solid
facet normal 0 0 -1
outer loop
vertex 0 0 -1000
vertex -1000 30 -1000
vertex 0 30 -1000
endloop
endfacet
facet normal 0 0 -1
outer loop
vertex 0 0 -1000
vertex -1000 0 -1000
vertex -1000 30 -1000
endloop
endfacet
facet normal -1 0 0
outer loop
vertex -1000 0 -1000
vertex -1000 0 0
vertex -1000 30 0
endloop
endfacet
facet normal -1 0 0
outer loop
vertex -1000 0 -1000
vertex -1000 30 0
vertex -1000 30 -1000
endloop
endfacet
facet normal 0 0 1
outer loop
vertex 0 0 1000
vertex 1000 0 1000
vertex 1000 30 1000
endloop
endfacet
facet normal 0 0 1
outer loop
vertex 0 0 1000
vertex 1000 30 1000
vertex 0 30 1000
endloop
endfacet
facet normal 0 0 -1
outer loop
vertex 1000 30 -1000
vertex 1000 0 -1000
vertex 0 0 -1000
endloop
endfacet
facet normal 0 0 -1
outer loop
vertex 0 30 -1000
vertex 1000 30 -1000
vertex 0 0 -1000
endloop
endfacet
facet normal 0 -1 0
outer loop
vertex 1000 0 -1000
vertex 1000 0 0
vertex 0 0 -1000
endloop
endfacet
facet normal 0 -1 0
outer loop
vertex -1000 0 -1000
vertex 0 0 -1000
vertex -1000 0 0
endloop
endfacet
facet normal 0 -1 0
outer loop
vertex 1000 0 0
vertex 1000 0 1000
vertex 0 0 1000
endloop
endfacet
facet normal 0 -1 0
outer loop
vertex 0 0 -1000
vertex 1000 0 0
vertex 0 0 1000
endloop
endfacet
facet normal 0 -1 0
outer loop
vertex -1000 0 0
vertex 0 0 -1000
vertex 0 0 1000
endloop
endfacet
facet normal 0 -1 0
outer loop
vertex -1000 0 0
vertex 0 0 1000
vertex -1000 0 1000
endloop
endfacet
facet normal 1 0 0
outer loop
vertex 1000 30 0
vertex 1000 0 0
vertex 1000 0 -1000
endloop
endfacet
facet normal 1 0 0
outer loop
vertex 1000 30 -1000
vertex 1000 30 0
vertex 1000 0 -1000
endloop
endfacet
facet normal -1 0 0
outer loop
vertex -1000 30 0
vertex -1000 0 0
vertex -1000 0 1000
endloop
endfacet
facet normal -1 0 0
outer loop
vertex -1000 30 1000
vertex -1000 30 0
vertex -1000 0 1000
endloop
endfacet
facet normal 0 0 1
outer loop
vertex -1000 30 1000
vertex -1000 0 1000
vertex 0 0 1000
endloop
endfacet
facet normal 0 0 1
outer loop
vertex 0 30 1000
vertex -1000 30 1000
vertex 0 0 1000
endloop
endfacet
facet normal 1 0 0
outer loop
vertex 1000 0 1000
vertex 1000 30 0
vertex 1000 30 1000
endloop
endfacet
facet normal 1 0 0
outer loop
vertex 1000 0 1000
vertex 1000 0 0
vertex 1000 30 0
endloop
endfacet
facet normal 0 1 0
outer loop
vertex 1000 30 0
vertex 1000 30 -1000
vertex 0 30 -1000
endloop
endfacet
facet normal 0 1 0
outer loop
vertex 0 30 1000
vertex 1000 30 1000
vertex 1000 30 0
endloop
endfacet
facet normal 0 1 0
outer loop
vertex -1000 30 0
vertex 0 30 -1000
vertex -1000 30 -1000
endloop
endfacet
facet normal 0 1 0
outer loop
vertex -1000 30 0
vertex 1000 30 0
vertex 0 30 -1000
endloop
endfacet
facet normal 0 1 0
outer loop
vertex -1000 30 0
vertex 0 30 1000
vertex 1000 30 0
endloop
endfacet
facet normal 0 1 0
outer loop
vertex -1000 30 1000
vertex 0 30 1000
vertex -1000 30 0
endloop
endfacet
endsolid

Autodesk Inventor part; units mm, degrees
ref_plane "YZ Plane" through (0, 0, 0) normal (1, 0, 0) x (0, 1, 0)
ref_plane "XZ Plane" through (0, 0, 0) normal (0, 1, 0) x (-1, 0, 0)
ref_plane "XY Plane" through (0, 0, 0) normal (0, 0, 1) x (1, 0, 0)
sketch "Szkic1" plane through (0, 0, 0) normal (0, 1, 0) x (-1, 0, 0)
  line L0 (0, 0) -> (1000, 0) construction
  line L1 (1000, 0) -> (1000, -1000)
  line L2 (1000, -1000) -> (0, -1000)
  line L3 (0, -1000) -> (0, 0) construction
  line L4 (1000, 0) -> (1000, 1000)
  line L5 (1000, 1000) -> (0, 1000)
  line L6 (-1000, 0) -> (-1000, -1000)
  line L7 (-1000, -1000) -> (0, -1000)
  line L8 (-1000, 0) -> (-1000, 1000)
  line L9 (-1000, 1000) -> (0, 1000)
  point P0 (500, -1000)
  point P1 (500, 0)
  dimension "d0" = 1000
  dimension "d1" = 1000
extrude "Wyciągnięcie proste1" add sketch "Szkic1" along normal blind 30
properties part number "podstawa_plyta_200_200_3"
